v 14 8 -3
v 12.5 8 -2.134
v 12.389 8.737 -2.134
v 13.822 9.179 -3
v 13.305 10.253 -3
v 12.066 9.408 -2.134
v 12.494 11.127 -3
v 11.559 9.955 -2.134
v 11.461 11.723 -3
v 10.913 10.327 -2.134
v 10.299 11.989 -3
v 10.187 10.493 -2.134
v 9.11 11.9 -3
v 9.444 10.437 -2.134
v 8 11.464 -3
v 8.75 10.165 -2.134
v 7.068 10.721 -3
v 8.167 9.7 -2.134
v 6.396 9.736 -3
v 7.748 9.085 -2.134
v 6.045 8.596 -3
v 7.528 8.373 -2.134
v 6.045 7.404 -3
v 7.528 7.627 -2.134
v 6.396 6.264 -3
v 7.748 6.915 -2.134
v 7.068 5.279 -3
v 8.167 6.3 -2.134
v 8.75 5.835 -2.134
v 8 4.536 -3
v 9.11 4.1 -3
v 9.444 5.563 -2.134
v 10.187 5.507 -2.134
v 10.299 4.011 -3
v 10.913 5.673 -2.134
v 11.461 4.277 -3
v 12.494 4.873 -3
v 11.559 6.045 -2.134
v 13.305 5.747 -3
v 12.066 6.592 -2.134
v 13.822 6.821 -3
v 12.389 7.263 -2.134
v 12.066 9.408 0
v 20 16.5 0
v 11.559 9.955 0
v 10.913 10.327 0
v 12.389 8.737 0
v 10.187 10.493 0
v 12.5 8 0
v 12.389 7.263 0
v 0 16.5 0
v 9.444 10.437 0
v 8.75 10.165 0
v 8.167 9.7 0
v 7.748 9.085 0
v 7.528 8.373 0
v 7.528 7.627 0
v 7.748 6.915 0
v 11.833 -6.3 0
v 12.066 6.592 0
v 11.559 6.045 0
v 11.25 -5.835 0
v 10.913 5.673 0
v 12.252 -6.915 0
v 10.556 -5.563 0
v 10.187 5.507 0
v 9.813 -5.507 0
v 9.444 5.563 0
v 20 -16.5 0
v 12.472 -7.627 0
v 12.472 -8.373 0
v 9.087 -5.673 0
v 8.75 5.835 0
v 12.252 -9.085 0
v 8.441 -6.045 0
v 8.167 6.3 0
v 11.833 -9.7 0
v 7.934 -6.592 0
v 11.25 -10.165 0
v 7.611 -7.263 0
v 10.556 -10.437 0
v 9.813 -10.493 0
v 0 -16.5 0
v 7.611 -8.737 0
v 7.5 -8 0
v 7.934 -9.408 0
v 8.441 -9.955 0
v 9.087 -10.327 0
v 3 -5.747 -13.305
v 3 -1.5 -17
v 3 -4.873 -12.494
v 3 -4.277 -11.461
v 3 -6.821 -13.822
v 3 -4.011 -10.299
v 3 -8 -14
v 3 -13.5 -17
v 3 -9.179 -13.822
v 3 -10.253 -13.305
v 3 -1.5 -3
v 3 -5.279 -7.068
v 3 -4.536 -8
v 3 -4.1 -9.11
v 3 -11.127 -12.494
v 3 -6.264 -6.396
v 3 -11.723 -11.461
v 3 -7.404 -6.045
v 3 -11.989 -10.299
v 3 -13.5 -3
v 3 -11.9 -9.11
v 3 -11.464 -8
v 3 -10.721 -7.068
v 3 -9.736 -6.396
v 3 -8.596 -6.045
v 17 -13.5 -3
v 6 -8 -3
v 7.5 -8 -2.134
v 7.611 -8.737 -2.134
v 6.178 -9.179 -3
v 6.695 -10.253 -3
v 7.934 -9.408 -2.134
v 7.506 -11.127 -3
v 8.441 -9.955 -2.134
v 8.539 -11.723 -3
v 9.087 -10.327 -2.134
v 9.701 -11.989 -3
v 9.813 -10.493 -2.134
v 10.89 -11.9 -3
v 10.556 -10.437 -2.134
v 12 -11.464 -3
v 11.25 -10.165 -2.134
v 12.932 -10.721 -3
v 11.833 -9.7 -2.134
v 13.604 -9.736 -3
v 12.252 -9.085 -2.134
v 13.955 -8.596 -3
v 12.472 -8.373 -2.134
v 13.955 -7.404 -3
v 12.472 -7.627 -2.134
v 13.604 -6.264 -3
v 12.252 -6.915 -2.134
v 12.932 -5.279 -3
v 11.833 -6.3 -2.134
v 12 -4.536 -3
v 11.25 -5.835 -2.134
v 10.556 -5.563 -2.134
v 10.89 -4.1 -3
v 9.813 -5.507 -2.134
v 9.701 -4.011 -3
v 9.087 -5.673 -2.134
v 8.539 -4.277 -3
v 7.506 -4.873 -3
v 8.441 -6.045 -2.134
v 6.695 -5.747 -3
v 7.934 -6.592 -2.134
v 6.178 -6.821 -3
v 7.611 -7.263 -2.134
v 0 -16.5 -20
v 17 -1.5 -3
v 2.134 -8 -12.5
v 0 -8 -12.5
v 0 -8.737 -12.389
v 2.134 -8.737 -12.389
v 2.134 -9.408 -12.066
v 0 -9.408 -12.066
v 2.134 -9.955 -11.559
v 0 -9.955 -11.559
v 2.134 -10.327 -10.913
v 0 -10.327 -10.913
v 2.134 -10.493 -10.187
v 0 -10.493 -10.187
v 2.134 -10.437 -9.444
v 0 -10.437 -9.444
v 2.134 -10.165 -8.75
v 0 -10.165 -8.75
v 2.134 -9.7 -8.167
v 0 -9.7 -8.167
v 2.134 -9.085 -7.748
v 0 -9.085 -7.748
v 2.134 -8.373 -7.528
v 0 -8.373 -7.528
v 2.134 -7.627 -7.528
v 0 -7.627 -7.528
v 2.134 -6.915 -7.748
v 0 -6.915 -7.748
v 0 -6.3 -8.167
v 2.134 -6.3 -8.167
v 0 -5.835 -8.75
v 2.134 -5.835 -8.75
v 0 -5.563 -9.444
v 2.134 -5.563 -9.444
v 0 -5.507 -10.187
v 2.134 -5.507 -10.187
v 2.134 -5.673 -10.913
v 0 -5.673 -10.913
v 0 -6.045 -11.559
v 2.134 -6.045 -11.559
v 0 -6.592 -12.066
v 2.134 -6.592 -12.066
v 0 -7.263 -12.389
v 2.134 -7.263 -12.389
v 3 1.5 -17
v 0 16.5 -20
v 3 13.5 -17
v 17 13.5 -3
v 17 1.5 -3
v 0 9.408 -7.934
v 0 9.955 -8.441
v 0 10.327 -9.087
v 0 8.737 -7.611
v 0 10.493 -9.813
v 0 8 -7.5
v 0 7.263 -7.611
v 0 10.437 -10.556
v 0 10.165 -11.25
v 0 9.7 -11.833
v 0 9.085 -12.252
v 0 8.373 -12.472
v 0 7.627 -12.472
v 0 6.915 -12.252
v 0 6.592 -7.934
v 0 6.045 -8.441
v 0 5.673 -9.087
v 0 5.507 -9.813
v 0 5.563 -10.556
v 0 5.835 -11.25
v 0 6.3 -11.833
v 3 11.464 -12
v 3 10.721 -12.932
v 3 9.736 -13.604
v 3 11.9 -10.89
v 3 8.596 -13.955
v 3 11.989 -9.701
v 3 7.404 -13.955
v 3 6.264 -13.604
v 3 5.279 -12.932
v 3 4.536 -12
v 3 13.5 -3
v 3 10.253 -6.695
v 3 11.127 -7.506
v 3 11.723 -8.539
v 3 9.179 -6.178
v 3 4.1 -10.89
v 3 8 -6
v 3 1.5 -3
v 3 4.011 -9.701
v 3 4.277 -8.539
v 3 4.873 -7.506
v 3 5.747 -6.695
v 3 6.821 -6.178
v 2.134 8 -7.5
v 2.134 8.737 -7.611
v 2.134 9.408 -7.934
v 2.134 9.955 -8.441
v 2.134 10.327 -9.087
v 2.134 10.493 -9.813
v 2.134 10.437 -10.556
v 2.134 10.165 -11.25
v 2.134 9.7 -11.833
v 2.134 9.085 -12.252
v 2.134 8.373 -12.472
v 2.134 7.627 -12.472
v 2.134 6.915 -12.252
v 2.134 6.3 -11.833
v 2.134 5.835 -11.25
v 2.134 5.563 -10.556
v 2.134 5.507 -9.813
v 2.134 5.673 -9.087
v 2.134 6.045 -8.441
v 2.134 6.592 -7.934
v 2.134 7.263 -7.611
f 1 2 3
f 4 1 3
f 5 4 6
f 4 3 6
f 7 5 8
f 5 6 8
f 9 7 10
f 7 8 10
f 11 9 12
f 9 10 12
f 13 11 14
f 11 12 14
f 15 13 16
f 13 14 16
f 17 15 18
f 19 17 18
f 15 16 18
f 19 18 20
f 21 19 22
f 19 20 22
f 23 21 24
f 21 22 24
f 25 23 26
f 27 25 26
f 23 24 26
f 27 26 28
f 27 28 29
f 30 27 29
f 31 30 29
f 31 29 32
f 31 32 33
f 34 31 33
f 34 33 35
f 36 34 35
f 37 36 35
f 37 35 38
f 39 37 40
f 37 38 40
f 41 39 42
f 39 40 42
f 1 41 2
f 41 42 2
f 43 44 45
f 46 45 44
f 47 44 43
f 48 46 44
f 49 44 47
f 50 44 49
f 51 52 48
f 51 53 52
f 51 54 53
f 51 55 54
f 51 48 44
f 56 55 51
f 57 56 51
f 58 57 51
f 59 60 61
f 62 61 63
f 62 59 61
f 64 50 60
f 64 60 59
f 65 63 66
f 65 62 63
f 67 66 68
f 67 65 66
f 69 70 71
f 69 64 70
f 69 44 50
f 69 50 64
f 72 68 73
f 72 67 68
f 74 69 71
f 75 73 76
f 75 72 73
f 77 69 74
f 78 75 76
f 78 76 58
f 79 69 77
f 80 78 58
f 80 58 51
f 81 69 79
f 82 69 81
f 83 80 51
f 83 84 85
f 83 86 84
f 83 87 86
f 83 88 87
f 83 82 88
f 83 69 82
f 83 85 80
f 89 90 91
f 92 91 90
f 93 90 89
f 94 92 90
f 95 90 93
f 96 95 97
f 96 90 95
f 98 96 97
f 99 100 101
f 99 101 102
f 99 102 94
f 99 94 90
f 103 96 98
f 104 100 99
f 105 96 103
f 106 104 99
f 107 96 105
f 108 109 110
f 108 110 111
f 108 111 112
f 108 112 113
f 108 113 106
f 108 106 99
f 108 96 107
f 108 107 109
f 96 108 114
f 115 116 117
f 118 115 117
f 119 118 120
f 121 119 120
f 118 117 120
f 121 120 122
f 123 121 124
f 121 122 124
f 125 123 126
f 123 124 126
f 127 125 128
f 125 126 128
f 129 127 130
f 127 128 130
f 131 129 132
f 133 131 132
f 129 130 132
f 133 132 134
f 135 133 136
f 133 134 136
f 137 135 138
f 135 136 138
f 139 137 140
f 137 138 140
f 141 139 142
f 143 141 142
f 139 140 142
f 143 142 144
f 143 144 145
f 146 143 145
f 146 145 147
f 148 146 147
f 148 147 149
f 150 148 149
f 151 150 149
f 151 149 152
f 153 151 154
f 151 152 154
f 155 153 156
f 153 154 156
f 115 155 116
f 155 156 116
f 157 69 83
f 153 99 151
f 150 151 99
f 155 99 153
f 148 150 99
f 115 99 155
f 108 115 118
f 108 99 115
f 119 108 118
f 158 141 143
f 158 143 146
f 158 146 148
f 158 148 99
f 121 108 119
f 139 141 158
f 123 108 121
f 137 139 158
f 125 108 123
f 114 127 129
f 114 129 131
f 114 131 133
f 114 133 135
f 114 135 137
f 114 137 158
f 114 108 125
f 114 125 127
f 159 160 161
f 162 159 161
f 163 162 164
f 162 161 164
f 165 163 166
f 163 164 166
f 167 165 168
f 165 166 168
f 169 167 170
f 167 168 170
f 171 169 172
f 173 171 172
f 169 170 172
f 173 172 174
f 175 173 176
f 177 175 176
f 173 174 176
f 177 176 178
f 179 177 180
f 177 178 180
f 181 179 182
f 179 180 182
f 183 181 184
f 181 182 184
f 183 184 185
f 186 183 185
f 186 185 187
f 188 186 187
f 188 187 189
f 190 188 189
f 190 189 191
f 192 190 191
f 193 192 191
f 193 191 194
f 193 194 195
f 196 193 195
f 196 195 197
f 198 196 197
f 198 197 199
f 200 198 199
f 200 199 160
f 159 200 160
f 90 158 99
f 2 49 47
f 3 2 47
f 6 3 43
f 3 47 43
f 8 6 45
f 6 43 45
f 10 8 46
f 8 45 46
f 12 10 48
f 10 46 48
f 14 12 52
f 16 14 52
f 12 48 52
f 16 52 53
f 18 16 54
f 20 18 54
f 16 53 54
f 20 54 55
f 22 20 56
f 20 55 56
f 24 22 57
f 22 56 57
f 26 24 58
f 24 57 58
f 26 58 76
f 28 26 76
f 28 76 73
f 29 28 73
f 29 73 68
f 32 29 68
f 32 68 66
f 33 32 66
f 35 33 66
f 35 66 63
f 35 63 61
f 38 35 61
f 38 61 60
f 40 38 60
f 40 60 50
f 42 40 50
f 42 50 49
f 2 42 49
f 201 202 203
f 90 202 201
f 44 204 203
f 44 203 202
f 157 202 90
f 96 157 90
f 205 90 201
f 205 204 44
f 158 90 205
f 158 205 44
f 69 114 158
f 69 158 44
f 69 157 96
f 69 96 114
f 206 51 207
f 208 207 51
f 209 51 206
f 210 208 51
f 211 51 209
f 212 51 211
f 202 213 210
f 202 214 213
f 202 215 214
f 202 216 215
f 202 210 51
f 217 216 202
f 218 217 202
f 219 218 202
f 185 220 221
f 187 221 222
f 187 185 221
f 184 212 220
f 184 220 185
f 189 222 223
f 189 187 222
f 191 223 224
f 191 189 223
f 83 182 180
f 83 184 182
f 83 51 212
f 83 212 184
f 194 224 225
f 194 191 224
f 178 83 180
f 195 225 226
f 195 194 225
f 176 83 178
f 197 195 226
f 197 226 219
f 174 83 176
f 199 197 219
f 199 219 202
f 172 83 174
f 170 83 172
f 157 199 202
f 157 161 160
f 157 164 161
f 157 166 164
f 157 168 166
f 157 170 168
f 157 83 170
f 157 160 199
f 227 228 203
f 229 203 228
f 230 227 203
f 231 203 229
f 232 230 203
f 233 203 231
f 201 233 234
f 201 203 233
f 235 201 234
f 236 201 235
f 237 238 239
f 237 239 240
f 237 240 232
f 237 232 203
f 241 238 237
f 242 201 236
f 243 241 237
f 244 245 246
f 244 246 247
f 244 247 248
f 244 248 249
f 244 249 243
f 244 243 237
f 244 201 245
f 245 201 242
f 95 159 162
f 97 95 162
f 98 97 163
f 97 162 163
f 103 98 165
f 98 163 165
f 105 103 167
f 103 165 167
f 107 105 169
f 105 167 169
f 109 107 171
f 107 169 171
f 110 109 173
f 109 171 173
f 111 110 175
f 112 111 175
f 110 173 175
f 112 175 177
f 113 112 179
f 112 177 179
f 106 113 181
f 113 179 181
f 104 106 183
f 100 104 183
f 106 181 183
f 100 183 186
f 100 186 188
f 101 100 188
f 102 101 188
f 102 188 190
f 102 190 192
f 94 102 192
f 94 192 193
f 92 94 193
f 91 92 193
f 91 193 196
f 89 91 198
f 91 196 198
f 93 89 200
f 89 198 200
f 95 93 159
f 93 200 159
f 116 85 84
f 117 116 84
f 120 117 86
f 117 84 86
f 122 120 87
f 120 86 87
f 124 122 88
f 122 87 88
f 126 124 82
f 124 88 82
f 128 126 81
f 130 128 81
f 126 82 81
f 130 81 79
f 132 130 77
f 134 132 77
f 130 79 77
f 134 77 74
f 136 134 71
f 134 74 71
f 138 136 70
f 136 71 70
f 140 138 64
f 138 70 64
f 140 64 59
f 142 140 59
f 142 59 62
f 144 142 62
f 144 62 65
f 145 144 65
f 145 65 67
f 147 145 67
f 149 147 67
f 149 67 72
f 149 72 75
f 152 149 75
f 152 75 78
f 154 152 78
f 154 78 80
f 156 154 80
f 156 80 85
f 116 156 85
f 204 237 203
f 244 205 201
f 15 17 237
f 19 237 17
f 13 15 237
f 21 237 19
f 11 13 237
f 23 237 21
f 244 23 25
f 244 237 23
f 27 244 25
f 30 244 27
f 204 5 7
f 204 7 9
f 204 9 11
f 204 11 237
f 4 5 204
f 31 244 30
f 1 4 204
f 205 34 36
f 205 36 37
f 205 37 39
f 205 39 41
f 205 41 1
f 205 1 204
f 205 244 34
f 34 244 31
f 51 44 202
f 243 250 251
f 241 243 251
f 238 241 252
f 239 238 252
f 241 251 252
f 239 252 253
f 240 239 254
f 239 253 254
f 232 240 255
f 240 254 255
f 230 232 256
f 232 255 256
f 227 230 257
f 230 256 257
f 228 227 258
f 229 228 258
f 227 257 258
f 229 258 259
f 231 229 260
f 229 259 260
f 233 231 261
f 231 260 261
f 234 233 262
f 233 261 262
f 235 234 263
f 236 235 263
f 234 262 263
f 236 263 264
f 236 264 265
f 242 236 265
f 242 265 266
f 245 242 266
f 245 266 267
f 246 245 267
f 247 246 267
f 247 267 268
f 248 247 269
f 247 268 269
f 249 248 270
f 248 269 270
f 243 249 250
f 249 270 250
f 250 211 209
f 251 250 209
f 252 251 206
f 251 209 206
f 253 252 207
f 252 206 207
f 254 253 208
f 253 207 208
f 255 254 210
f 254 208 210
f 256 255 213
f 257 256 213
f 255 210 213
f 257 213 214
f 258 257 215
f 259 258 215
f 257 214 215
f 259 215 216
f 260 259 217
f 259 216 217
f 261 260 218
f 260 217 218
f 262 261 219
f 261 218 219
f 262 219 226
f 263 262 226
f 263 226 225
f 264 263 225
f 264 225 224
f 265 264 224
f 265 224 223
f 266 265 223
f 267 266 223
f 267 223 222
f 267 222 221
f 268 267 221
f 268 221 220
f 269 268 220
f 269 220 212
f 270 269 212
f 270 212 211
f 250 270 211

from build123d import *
from OCP.BRepFilletAPI import BRepFilletAPI_MakeChamfer

# Parameters (mm, degrees)
EXTRUDE_1_DEPTH      = 16.5
EXTRUDE_1_DEPTH_BACK = 16.5
EXTRUDE_2_DEPTH      = 3
EXTRUDE_3_DEPTH      = 3
EXTRUDE_4_DEPTH      = 1.5
EXTRUDE_4_DEPTH_BACK = 1.5
SKETCH_5_R           = 2.5
CUT_EXTRUDE_1_DEPTH  = 33.74522866
SKETCH_6_R           = 2.5
CUT_EXTRUDE_2_DEPTH  = 33.74522866
CHAMFER_1_SIZE       = 1.5
CHAMFER_1_SIZE2      = 0.866025404


with BuildPart() as part:
    # Эскиз1 → Бобышка-Вытянуть1 (new, two sides: drawn at the far end of the back side and taken through both)
    with BuildSketch(Plane(origin=(0, 0, 0), x_dir=(1, 0, 0), z_dir=(0, 1, 0)).offset(-EXTRUDE_1_DEPTH_BACK)):
        Polygon((0, 0), (0, 20), (3, 17), (3, 3), (17, 3), (20, 0), align=None)
    extrude(amount=EXTRUDE_1_DEPTH + EXTRUDE_1_DEPTH_BACK)

    # Эскиз2 → Бобышка-Вытянуть2 (add)
    with BuildSketch(Plane(origin=(0, 16.5, 0), x_dir=(1, 0, 0), z_dir=(0, 1, 0))):
        Polygon((0, 20), (0, 0), (20, 0), align=None)
    extrude(amount=-EXTRUDE_2_DEPTH)

    # Эскиз3 → Бобышка-Вытянуть3 (add)
    with BuildSketch(Plane(origin=(0, -16.5, 0), x_dir=(-1, 0, 0), z_dir=(0, -1, 0))):
        Polygon((0, 0), (-20, 0), (0, 20), align=None)
    extrude(amount=-EXTRUDE_3_DEPTH)

    # Эскиз4 → Бобышка-Вытянуть4 (add, two sides: drawn at the far end of the back side and taken through both)
    with BuildSketch(Plane(origin=(0, 0, 0), x_dir=(1, 0, 0), z_dir=(0, 1, 0)).offset(-EXTRUDE_4_DEPTH_BACK)):
        Polygon((20, 0), (0, 0), (0, 20), align=None)
    extrude(amount=EXTRUDE_4_DEPTH + EXTRUDE_4_DEPTH_BACK)

    # Эскиз5 → Вырез-Вытянуть1 (cut, through all)
    with BuildSketch(Plane.XY):
        with Locations((10, 8)):
            Circle(SKETCH_5_R)
        with Locations((10, -8)):
            Circle(SKETCH_5_R)
    extrude(amount=-CUT_EXTRUDE_1_DEPTH, mode=Mode.SUBTRACT)

    # Эскиз6 → Вырез-Вытянуть2 (cut, through all)
    with BuildSketch(Plane.ZY):
        with Locations((-10, 8)):
            Circle(SKETCH_6_R)
        with Locations((-10, -8)):
            Circle(SKETCH_6_R)
    extrude(amount=-CUT_EXTRUDE_2_DEPTH, mode=Mode.SUBTRACT)

    # Фаска1: one chamfer whose edges measure the first distance from different faces: ONE call of the kernel's chamfer builder (chamfer() names one face for all edges)
    chamfer_1_edges_1 = [part.edges().sort_by_distance(p)[0] for p in [
        (7.5, 8, -3),
    ]]
    chamfer_1_side_1 = [part.faces().sort_by_distance(p)[0] for p in [
        (3.184390889, 7.5, -3),
    ]]
    chamfer_1_edges_2 = [part.edges().sort_by_distance(p)[0] for p in [
        (7.5, -8, -3),
    ]]
    chamfer_1_side_2 = [part.faces().sort_by_distance(p)[0] for p in [
        (3.184390889, -7.5, -3),
    ]]
    chamfer_1_edges_3 = [part.edges().sort_by_distance(p)[0] for p in [
        (3, -8, -12.5),
    ]]
    chamfer_1_side_3 = [part.faces().sort_by_distance(p)[0] for p in [
        (3, -7.5, -16.815609111),
    ]]
    chamfer_1_edges_4 = [part.edges().sort_by_distance(p)[0] for p in [
        (3, 8, -12.5),
    ]]
    chamfer_1_side_4 = [part.faces().sort_by_distance(p)[0] for p in [
        (3, 7.5, -16.815609111),
    ]]
    chamfer_1 = BRepFilletAPI_MakeChamfer(part.part.solid().wrapped)
    for e in chamfer_1_edges_1:
        chamfer_1.Add(CHAMFER_1_SIZE, CHAMFER_1_SIZE2, e.wrapped, chamfer_1_side_1[0].wrapped)  # the first distance lies on this face
    for e in chamfer_1_edges_2:
        chamfer_1.Add(CHAMFER_1_SIZE, CHAMFER_1_SIZE2, e.wrapped, chamfer_1_side_2[0].wrapped)  # the first distance lies on this face
    for e in chamfer_1_edges_3:
        chamfer_1.Add(CHAMFER_1_SIZE, CHAMFER_1_SIZE2, e.wrapped, chamfer_1_side_3[0].wrapped)  # the first distance lies on this face
    for e in chamfer_1_edges_4:
        chamfer_1.Add(CHAMFER_1_SIZE, CHAMFER_1_SIZE2, e.wrapped, chamfer_1_side_4[0].wrapped)  # the first distance lies on this face
    add(Compound.cast(chamfer_1.Shape()), mode=Mode.REPLACE)


solid = part.part
